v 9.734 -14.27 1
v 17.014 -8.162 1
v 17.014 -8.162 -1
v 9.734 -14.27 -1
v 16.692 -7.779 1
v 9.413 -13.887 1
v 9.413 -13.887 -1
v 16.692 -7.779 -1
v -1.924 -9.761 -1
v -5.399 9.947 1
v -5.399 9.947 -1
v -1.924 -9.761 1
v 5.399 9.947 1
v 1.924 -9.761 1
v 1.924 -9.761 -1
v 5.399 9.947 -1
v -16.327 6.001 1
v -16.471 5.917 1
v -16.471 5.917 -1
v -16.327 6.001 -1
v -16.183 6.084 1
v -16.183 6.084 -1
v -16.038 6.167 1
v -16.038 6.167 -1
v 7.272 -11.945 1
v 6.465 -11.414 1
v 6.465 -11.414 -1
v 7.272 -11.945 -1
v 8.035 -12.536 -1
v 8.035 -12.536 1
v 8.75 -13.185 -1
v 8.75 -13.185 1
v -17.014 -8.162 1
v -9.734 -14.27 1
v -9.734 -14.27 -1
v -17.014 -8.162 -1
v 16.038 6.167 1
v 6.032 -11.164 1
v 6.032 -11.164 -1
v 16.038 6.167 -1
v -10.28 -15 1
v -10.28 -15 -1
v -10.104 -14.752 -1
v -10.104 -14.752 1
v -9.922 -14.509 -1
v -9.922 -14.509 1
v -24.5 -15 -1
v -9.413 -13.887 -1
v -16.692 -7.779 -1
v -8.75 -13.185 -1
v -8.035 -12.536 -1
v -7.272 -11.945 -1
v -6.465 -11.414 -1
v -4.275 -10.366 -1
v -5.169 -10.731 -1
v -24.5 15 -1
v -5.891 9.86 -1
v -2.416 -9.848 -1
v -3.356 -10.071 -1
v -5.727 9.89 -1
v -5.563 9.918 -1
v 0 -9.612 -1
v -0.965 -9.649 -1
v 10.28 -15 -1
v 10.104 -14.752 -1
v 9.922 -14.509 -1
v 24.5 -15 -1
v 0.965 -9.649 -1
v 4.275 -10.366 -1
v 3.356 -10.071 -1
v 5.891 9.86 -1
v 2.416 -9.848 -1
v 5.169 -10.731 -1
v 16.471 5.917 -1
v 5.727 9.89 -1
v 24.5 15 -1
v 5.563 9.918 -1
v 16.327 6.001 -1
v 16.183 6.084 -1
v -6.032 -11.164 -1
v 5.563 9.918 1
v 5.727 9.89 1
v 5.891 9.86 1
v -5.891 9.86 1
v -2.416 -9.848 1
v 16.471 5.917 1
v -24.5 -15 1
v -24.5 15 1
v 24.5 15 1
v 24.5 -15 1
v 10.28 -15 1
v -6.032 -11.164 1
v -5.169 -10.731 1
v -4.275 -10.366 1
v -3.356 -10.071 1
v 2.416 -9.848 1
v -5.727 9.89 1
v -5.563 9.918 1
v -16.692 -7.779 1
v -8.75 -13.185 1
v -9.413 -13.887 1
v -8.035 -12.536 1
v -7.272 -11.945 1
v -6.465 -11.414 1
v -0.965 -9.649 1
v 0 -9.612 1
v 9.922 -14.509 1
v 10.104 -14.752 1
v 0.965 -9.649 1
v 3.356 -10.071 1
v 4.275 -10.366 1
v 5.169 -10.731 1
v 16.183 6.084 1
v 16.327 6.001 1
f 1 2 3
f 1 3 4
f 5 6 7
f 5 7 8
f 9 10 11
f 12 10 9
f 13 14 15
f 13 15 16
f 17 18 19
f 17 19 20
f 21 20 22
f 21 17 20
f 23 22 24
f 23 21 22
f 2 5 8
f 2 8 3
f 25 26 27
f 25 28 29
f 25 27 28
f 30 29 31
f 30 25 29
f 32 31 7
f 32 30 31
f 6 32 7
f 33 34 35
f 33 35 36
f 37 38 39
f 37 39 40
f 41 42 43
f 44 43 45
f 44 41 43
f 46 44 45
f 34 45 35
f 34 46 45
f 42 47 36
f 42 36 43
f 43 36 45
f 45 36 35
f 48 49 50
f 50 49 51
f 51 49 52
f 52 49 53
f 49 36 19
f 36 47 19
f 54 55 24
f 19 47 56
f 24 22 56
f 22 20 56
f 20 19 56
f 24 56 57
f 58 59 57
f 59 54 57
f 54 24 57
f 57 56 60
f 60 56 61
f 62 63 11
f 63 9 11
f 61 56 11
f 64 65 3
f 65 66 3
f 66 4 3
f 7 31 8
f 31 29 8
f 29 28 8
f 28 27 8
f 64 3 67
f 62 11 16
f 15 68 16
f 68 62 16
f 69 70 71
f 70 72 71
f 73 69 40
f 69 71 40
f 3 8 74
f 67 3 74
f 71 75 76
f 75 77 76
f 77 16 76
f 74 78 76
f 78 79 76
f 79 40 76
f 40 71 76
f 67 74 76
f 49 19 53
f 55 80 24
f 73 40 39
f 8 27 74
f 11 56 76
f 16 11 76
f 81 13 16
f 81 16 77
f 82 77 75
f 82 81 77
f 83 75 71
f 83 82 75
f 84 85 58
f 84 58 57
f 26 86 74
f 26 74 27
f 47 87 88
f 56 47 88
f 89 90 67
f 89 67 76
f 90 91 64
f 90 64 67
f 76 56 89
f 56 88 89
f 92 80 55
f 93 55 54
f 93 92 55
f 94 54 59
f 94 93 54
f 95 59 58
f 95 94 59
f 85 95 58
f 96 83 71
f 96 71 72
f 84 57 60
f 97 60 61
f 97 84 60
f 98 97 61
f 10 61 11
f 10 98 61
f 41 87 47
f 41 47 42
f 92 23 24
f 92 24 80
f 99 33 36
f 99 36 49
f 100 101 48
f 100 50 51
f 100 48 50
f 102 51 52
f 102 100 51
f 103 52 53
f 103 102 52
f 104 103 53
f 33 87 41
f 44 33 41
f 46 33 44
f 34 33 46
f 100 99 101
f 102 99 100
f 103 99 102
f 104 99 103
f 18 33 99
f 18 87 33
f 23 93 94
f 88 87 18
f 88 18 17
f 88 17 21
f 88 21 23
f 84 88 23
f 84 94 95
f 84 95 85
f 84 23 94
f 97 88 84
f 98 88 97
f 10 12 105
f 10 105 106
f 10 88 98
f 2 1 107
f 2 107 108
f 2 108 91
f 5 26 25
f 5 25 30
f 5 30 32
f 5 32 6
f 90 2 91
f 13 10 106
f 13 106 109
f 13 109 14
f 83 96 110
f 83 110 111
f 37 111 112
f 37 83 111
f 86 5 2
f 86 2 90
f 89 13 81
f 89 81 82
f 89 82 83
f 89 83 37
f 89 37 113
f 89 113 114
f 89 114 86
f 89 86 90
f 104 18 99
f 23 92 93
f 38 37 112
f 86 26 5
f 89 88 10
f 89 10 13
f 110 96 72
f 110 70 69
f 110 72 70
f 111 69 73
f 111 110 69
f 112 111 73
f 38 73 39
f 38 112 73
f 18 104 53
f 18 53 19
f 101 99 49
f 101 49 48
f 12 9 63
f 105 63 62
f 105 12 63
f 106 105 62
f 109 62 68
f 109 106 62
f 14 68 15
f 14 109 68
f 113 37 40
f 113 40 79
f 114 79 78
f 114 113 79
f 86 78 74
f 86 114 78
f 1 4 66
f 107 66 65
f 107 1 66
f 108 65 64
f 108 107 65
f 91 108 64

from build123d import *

# Parameters (mm, degrees)
SKETCH1_W           = 49
SKETCH1_H           = 30
BOSS_EXTRUDE1_DEPTH = 1
CUT_EXTRUDE1_DEPTH  = 10


with BuildPart() as part:
    # Sketch1 → Boss-Extrude1 (new body, symmetric)
    with BuildSketch(Plane.XY):
        Rectangle(SKETCH1_W, SKETCH1_H)
    extrude(amount=BOSS_EXTRUDE1_DEPTH, both=True)

    # Sketch2 → Cut-Extrude1 (cut)
    with BuildSketch(Plane.XY.offset(1)):
        with BuildLine():
            Line((-9.734337139, -14.270273119), (-17.013674651, -8.162183698))
            Line((-17.013674651, -8.162183698), (-16.692280846, -7.779161476))
            Line((-16.692280846, -7.779161476), (-9.412943334, -13.887250898))
            ThreePointArc((-9.412943334, -13.887250898), (-8.034845121, -12.536444461), (-6.465256226, -11.413847733))
            Line((-6.465256226, -11.413847733), (-16.471025722, 5.916653404))
            ThreePointArc((-16.471025722, 5.916653404), (-16.255, 6.042485877), (-16.038013021, 6.166653404))
            Line((-16.038013021, 6.166653404), (-6.032243524, -11.163847733))
            ThreePointArc((-6.032243524, -11.163847733), (-4.275251792, -10.36584224), (-2.416369995, -9.847777397))
            Line((-2.416369995, -9.847777397), (-5.891337274, 9.859741353))
            ThreePointArc((-5.891337274, 9.859741353), (-5.645302256, 9.90410005), (-5.398933397, 9.946565442))
            Line((-5.398933397, 9.946565442), (-1.923966119, -9.760953309))
            ThreePointArc((-1.923966119, -9.760953309), (0, -9.612), (1.923966119, -9.760953309))
            Line((1.923966119, -9.760953309), (5.398933397, 9.946565442))
            ThreePointArc((5.398933397, 9.946565442), (5.645302256, 9.90410005), (5.891337274, 9.859741353))
            Line((5.891337274, 9.859741353), (2.416369995, -9.847777397))
            ThreePointArc((2.416369995, -9.847777397), (4.275251792, -10.36584224), (6.032243524, -11.163847733))
            Line((6.032243524, -11.163847733), (16.038013021, 6.166653404))
            ThreePointArc((16.038013021, 6.166653404), (16.255, 6.042485877), (16.471025722, 5.916653404))
            Line((16.471025722, 5.916653404), (6.465256226, -11.413847733))
            ThreePointArc((6.465256226, -11.413847733), (8.034845121, -12.536444461), (9.412943334, -13.887250898))
            Line((9.412943334, -13.887250898), (16.692280846, -7.779161476))
            Line((16.692280846, -7.779161476), (17.013674651, -8.162183698))
            Line((17.013674651, -8.162183698), (9.734337139, -14.270273119))
            ThreePointArc((9.734337139, -14.270273119), (10.013600489, -14.630168322), (10.279564971, -15))
            Line((10.279564971, -15), (-10.279564971, -15))
            ThreePointArc((-10.279564971, -15), (-10.013600489, -14.630168322), (-9.734337139, -14.270273119))
        make_face()
    extrude(amount=-CUT_EXTRUDE1_DEPTH, mode=Mode.SUBTRACT)


solid = part.part
